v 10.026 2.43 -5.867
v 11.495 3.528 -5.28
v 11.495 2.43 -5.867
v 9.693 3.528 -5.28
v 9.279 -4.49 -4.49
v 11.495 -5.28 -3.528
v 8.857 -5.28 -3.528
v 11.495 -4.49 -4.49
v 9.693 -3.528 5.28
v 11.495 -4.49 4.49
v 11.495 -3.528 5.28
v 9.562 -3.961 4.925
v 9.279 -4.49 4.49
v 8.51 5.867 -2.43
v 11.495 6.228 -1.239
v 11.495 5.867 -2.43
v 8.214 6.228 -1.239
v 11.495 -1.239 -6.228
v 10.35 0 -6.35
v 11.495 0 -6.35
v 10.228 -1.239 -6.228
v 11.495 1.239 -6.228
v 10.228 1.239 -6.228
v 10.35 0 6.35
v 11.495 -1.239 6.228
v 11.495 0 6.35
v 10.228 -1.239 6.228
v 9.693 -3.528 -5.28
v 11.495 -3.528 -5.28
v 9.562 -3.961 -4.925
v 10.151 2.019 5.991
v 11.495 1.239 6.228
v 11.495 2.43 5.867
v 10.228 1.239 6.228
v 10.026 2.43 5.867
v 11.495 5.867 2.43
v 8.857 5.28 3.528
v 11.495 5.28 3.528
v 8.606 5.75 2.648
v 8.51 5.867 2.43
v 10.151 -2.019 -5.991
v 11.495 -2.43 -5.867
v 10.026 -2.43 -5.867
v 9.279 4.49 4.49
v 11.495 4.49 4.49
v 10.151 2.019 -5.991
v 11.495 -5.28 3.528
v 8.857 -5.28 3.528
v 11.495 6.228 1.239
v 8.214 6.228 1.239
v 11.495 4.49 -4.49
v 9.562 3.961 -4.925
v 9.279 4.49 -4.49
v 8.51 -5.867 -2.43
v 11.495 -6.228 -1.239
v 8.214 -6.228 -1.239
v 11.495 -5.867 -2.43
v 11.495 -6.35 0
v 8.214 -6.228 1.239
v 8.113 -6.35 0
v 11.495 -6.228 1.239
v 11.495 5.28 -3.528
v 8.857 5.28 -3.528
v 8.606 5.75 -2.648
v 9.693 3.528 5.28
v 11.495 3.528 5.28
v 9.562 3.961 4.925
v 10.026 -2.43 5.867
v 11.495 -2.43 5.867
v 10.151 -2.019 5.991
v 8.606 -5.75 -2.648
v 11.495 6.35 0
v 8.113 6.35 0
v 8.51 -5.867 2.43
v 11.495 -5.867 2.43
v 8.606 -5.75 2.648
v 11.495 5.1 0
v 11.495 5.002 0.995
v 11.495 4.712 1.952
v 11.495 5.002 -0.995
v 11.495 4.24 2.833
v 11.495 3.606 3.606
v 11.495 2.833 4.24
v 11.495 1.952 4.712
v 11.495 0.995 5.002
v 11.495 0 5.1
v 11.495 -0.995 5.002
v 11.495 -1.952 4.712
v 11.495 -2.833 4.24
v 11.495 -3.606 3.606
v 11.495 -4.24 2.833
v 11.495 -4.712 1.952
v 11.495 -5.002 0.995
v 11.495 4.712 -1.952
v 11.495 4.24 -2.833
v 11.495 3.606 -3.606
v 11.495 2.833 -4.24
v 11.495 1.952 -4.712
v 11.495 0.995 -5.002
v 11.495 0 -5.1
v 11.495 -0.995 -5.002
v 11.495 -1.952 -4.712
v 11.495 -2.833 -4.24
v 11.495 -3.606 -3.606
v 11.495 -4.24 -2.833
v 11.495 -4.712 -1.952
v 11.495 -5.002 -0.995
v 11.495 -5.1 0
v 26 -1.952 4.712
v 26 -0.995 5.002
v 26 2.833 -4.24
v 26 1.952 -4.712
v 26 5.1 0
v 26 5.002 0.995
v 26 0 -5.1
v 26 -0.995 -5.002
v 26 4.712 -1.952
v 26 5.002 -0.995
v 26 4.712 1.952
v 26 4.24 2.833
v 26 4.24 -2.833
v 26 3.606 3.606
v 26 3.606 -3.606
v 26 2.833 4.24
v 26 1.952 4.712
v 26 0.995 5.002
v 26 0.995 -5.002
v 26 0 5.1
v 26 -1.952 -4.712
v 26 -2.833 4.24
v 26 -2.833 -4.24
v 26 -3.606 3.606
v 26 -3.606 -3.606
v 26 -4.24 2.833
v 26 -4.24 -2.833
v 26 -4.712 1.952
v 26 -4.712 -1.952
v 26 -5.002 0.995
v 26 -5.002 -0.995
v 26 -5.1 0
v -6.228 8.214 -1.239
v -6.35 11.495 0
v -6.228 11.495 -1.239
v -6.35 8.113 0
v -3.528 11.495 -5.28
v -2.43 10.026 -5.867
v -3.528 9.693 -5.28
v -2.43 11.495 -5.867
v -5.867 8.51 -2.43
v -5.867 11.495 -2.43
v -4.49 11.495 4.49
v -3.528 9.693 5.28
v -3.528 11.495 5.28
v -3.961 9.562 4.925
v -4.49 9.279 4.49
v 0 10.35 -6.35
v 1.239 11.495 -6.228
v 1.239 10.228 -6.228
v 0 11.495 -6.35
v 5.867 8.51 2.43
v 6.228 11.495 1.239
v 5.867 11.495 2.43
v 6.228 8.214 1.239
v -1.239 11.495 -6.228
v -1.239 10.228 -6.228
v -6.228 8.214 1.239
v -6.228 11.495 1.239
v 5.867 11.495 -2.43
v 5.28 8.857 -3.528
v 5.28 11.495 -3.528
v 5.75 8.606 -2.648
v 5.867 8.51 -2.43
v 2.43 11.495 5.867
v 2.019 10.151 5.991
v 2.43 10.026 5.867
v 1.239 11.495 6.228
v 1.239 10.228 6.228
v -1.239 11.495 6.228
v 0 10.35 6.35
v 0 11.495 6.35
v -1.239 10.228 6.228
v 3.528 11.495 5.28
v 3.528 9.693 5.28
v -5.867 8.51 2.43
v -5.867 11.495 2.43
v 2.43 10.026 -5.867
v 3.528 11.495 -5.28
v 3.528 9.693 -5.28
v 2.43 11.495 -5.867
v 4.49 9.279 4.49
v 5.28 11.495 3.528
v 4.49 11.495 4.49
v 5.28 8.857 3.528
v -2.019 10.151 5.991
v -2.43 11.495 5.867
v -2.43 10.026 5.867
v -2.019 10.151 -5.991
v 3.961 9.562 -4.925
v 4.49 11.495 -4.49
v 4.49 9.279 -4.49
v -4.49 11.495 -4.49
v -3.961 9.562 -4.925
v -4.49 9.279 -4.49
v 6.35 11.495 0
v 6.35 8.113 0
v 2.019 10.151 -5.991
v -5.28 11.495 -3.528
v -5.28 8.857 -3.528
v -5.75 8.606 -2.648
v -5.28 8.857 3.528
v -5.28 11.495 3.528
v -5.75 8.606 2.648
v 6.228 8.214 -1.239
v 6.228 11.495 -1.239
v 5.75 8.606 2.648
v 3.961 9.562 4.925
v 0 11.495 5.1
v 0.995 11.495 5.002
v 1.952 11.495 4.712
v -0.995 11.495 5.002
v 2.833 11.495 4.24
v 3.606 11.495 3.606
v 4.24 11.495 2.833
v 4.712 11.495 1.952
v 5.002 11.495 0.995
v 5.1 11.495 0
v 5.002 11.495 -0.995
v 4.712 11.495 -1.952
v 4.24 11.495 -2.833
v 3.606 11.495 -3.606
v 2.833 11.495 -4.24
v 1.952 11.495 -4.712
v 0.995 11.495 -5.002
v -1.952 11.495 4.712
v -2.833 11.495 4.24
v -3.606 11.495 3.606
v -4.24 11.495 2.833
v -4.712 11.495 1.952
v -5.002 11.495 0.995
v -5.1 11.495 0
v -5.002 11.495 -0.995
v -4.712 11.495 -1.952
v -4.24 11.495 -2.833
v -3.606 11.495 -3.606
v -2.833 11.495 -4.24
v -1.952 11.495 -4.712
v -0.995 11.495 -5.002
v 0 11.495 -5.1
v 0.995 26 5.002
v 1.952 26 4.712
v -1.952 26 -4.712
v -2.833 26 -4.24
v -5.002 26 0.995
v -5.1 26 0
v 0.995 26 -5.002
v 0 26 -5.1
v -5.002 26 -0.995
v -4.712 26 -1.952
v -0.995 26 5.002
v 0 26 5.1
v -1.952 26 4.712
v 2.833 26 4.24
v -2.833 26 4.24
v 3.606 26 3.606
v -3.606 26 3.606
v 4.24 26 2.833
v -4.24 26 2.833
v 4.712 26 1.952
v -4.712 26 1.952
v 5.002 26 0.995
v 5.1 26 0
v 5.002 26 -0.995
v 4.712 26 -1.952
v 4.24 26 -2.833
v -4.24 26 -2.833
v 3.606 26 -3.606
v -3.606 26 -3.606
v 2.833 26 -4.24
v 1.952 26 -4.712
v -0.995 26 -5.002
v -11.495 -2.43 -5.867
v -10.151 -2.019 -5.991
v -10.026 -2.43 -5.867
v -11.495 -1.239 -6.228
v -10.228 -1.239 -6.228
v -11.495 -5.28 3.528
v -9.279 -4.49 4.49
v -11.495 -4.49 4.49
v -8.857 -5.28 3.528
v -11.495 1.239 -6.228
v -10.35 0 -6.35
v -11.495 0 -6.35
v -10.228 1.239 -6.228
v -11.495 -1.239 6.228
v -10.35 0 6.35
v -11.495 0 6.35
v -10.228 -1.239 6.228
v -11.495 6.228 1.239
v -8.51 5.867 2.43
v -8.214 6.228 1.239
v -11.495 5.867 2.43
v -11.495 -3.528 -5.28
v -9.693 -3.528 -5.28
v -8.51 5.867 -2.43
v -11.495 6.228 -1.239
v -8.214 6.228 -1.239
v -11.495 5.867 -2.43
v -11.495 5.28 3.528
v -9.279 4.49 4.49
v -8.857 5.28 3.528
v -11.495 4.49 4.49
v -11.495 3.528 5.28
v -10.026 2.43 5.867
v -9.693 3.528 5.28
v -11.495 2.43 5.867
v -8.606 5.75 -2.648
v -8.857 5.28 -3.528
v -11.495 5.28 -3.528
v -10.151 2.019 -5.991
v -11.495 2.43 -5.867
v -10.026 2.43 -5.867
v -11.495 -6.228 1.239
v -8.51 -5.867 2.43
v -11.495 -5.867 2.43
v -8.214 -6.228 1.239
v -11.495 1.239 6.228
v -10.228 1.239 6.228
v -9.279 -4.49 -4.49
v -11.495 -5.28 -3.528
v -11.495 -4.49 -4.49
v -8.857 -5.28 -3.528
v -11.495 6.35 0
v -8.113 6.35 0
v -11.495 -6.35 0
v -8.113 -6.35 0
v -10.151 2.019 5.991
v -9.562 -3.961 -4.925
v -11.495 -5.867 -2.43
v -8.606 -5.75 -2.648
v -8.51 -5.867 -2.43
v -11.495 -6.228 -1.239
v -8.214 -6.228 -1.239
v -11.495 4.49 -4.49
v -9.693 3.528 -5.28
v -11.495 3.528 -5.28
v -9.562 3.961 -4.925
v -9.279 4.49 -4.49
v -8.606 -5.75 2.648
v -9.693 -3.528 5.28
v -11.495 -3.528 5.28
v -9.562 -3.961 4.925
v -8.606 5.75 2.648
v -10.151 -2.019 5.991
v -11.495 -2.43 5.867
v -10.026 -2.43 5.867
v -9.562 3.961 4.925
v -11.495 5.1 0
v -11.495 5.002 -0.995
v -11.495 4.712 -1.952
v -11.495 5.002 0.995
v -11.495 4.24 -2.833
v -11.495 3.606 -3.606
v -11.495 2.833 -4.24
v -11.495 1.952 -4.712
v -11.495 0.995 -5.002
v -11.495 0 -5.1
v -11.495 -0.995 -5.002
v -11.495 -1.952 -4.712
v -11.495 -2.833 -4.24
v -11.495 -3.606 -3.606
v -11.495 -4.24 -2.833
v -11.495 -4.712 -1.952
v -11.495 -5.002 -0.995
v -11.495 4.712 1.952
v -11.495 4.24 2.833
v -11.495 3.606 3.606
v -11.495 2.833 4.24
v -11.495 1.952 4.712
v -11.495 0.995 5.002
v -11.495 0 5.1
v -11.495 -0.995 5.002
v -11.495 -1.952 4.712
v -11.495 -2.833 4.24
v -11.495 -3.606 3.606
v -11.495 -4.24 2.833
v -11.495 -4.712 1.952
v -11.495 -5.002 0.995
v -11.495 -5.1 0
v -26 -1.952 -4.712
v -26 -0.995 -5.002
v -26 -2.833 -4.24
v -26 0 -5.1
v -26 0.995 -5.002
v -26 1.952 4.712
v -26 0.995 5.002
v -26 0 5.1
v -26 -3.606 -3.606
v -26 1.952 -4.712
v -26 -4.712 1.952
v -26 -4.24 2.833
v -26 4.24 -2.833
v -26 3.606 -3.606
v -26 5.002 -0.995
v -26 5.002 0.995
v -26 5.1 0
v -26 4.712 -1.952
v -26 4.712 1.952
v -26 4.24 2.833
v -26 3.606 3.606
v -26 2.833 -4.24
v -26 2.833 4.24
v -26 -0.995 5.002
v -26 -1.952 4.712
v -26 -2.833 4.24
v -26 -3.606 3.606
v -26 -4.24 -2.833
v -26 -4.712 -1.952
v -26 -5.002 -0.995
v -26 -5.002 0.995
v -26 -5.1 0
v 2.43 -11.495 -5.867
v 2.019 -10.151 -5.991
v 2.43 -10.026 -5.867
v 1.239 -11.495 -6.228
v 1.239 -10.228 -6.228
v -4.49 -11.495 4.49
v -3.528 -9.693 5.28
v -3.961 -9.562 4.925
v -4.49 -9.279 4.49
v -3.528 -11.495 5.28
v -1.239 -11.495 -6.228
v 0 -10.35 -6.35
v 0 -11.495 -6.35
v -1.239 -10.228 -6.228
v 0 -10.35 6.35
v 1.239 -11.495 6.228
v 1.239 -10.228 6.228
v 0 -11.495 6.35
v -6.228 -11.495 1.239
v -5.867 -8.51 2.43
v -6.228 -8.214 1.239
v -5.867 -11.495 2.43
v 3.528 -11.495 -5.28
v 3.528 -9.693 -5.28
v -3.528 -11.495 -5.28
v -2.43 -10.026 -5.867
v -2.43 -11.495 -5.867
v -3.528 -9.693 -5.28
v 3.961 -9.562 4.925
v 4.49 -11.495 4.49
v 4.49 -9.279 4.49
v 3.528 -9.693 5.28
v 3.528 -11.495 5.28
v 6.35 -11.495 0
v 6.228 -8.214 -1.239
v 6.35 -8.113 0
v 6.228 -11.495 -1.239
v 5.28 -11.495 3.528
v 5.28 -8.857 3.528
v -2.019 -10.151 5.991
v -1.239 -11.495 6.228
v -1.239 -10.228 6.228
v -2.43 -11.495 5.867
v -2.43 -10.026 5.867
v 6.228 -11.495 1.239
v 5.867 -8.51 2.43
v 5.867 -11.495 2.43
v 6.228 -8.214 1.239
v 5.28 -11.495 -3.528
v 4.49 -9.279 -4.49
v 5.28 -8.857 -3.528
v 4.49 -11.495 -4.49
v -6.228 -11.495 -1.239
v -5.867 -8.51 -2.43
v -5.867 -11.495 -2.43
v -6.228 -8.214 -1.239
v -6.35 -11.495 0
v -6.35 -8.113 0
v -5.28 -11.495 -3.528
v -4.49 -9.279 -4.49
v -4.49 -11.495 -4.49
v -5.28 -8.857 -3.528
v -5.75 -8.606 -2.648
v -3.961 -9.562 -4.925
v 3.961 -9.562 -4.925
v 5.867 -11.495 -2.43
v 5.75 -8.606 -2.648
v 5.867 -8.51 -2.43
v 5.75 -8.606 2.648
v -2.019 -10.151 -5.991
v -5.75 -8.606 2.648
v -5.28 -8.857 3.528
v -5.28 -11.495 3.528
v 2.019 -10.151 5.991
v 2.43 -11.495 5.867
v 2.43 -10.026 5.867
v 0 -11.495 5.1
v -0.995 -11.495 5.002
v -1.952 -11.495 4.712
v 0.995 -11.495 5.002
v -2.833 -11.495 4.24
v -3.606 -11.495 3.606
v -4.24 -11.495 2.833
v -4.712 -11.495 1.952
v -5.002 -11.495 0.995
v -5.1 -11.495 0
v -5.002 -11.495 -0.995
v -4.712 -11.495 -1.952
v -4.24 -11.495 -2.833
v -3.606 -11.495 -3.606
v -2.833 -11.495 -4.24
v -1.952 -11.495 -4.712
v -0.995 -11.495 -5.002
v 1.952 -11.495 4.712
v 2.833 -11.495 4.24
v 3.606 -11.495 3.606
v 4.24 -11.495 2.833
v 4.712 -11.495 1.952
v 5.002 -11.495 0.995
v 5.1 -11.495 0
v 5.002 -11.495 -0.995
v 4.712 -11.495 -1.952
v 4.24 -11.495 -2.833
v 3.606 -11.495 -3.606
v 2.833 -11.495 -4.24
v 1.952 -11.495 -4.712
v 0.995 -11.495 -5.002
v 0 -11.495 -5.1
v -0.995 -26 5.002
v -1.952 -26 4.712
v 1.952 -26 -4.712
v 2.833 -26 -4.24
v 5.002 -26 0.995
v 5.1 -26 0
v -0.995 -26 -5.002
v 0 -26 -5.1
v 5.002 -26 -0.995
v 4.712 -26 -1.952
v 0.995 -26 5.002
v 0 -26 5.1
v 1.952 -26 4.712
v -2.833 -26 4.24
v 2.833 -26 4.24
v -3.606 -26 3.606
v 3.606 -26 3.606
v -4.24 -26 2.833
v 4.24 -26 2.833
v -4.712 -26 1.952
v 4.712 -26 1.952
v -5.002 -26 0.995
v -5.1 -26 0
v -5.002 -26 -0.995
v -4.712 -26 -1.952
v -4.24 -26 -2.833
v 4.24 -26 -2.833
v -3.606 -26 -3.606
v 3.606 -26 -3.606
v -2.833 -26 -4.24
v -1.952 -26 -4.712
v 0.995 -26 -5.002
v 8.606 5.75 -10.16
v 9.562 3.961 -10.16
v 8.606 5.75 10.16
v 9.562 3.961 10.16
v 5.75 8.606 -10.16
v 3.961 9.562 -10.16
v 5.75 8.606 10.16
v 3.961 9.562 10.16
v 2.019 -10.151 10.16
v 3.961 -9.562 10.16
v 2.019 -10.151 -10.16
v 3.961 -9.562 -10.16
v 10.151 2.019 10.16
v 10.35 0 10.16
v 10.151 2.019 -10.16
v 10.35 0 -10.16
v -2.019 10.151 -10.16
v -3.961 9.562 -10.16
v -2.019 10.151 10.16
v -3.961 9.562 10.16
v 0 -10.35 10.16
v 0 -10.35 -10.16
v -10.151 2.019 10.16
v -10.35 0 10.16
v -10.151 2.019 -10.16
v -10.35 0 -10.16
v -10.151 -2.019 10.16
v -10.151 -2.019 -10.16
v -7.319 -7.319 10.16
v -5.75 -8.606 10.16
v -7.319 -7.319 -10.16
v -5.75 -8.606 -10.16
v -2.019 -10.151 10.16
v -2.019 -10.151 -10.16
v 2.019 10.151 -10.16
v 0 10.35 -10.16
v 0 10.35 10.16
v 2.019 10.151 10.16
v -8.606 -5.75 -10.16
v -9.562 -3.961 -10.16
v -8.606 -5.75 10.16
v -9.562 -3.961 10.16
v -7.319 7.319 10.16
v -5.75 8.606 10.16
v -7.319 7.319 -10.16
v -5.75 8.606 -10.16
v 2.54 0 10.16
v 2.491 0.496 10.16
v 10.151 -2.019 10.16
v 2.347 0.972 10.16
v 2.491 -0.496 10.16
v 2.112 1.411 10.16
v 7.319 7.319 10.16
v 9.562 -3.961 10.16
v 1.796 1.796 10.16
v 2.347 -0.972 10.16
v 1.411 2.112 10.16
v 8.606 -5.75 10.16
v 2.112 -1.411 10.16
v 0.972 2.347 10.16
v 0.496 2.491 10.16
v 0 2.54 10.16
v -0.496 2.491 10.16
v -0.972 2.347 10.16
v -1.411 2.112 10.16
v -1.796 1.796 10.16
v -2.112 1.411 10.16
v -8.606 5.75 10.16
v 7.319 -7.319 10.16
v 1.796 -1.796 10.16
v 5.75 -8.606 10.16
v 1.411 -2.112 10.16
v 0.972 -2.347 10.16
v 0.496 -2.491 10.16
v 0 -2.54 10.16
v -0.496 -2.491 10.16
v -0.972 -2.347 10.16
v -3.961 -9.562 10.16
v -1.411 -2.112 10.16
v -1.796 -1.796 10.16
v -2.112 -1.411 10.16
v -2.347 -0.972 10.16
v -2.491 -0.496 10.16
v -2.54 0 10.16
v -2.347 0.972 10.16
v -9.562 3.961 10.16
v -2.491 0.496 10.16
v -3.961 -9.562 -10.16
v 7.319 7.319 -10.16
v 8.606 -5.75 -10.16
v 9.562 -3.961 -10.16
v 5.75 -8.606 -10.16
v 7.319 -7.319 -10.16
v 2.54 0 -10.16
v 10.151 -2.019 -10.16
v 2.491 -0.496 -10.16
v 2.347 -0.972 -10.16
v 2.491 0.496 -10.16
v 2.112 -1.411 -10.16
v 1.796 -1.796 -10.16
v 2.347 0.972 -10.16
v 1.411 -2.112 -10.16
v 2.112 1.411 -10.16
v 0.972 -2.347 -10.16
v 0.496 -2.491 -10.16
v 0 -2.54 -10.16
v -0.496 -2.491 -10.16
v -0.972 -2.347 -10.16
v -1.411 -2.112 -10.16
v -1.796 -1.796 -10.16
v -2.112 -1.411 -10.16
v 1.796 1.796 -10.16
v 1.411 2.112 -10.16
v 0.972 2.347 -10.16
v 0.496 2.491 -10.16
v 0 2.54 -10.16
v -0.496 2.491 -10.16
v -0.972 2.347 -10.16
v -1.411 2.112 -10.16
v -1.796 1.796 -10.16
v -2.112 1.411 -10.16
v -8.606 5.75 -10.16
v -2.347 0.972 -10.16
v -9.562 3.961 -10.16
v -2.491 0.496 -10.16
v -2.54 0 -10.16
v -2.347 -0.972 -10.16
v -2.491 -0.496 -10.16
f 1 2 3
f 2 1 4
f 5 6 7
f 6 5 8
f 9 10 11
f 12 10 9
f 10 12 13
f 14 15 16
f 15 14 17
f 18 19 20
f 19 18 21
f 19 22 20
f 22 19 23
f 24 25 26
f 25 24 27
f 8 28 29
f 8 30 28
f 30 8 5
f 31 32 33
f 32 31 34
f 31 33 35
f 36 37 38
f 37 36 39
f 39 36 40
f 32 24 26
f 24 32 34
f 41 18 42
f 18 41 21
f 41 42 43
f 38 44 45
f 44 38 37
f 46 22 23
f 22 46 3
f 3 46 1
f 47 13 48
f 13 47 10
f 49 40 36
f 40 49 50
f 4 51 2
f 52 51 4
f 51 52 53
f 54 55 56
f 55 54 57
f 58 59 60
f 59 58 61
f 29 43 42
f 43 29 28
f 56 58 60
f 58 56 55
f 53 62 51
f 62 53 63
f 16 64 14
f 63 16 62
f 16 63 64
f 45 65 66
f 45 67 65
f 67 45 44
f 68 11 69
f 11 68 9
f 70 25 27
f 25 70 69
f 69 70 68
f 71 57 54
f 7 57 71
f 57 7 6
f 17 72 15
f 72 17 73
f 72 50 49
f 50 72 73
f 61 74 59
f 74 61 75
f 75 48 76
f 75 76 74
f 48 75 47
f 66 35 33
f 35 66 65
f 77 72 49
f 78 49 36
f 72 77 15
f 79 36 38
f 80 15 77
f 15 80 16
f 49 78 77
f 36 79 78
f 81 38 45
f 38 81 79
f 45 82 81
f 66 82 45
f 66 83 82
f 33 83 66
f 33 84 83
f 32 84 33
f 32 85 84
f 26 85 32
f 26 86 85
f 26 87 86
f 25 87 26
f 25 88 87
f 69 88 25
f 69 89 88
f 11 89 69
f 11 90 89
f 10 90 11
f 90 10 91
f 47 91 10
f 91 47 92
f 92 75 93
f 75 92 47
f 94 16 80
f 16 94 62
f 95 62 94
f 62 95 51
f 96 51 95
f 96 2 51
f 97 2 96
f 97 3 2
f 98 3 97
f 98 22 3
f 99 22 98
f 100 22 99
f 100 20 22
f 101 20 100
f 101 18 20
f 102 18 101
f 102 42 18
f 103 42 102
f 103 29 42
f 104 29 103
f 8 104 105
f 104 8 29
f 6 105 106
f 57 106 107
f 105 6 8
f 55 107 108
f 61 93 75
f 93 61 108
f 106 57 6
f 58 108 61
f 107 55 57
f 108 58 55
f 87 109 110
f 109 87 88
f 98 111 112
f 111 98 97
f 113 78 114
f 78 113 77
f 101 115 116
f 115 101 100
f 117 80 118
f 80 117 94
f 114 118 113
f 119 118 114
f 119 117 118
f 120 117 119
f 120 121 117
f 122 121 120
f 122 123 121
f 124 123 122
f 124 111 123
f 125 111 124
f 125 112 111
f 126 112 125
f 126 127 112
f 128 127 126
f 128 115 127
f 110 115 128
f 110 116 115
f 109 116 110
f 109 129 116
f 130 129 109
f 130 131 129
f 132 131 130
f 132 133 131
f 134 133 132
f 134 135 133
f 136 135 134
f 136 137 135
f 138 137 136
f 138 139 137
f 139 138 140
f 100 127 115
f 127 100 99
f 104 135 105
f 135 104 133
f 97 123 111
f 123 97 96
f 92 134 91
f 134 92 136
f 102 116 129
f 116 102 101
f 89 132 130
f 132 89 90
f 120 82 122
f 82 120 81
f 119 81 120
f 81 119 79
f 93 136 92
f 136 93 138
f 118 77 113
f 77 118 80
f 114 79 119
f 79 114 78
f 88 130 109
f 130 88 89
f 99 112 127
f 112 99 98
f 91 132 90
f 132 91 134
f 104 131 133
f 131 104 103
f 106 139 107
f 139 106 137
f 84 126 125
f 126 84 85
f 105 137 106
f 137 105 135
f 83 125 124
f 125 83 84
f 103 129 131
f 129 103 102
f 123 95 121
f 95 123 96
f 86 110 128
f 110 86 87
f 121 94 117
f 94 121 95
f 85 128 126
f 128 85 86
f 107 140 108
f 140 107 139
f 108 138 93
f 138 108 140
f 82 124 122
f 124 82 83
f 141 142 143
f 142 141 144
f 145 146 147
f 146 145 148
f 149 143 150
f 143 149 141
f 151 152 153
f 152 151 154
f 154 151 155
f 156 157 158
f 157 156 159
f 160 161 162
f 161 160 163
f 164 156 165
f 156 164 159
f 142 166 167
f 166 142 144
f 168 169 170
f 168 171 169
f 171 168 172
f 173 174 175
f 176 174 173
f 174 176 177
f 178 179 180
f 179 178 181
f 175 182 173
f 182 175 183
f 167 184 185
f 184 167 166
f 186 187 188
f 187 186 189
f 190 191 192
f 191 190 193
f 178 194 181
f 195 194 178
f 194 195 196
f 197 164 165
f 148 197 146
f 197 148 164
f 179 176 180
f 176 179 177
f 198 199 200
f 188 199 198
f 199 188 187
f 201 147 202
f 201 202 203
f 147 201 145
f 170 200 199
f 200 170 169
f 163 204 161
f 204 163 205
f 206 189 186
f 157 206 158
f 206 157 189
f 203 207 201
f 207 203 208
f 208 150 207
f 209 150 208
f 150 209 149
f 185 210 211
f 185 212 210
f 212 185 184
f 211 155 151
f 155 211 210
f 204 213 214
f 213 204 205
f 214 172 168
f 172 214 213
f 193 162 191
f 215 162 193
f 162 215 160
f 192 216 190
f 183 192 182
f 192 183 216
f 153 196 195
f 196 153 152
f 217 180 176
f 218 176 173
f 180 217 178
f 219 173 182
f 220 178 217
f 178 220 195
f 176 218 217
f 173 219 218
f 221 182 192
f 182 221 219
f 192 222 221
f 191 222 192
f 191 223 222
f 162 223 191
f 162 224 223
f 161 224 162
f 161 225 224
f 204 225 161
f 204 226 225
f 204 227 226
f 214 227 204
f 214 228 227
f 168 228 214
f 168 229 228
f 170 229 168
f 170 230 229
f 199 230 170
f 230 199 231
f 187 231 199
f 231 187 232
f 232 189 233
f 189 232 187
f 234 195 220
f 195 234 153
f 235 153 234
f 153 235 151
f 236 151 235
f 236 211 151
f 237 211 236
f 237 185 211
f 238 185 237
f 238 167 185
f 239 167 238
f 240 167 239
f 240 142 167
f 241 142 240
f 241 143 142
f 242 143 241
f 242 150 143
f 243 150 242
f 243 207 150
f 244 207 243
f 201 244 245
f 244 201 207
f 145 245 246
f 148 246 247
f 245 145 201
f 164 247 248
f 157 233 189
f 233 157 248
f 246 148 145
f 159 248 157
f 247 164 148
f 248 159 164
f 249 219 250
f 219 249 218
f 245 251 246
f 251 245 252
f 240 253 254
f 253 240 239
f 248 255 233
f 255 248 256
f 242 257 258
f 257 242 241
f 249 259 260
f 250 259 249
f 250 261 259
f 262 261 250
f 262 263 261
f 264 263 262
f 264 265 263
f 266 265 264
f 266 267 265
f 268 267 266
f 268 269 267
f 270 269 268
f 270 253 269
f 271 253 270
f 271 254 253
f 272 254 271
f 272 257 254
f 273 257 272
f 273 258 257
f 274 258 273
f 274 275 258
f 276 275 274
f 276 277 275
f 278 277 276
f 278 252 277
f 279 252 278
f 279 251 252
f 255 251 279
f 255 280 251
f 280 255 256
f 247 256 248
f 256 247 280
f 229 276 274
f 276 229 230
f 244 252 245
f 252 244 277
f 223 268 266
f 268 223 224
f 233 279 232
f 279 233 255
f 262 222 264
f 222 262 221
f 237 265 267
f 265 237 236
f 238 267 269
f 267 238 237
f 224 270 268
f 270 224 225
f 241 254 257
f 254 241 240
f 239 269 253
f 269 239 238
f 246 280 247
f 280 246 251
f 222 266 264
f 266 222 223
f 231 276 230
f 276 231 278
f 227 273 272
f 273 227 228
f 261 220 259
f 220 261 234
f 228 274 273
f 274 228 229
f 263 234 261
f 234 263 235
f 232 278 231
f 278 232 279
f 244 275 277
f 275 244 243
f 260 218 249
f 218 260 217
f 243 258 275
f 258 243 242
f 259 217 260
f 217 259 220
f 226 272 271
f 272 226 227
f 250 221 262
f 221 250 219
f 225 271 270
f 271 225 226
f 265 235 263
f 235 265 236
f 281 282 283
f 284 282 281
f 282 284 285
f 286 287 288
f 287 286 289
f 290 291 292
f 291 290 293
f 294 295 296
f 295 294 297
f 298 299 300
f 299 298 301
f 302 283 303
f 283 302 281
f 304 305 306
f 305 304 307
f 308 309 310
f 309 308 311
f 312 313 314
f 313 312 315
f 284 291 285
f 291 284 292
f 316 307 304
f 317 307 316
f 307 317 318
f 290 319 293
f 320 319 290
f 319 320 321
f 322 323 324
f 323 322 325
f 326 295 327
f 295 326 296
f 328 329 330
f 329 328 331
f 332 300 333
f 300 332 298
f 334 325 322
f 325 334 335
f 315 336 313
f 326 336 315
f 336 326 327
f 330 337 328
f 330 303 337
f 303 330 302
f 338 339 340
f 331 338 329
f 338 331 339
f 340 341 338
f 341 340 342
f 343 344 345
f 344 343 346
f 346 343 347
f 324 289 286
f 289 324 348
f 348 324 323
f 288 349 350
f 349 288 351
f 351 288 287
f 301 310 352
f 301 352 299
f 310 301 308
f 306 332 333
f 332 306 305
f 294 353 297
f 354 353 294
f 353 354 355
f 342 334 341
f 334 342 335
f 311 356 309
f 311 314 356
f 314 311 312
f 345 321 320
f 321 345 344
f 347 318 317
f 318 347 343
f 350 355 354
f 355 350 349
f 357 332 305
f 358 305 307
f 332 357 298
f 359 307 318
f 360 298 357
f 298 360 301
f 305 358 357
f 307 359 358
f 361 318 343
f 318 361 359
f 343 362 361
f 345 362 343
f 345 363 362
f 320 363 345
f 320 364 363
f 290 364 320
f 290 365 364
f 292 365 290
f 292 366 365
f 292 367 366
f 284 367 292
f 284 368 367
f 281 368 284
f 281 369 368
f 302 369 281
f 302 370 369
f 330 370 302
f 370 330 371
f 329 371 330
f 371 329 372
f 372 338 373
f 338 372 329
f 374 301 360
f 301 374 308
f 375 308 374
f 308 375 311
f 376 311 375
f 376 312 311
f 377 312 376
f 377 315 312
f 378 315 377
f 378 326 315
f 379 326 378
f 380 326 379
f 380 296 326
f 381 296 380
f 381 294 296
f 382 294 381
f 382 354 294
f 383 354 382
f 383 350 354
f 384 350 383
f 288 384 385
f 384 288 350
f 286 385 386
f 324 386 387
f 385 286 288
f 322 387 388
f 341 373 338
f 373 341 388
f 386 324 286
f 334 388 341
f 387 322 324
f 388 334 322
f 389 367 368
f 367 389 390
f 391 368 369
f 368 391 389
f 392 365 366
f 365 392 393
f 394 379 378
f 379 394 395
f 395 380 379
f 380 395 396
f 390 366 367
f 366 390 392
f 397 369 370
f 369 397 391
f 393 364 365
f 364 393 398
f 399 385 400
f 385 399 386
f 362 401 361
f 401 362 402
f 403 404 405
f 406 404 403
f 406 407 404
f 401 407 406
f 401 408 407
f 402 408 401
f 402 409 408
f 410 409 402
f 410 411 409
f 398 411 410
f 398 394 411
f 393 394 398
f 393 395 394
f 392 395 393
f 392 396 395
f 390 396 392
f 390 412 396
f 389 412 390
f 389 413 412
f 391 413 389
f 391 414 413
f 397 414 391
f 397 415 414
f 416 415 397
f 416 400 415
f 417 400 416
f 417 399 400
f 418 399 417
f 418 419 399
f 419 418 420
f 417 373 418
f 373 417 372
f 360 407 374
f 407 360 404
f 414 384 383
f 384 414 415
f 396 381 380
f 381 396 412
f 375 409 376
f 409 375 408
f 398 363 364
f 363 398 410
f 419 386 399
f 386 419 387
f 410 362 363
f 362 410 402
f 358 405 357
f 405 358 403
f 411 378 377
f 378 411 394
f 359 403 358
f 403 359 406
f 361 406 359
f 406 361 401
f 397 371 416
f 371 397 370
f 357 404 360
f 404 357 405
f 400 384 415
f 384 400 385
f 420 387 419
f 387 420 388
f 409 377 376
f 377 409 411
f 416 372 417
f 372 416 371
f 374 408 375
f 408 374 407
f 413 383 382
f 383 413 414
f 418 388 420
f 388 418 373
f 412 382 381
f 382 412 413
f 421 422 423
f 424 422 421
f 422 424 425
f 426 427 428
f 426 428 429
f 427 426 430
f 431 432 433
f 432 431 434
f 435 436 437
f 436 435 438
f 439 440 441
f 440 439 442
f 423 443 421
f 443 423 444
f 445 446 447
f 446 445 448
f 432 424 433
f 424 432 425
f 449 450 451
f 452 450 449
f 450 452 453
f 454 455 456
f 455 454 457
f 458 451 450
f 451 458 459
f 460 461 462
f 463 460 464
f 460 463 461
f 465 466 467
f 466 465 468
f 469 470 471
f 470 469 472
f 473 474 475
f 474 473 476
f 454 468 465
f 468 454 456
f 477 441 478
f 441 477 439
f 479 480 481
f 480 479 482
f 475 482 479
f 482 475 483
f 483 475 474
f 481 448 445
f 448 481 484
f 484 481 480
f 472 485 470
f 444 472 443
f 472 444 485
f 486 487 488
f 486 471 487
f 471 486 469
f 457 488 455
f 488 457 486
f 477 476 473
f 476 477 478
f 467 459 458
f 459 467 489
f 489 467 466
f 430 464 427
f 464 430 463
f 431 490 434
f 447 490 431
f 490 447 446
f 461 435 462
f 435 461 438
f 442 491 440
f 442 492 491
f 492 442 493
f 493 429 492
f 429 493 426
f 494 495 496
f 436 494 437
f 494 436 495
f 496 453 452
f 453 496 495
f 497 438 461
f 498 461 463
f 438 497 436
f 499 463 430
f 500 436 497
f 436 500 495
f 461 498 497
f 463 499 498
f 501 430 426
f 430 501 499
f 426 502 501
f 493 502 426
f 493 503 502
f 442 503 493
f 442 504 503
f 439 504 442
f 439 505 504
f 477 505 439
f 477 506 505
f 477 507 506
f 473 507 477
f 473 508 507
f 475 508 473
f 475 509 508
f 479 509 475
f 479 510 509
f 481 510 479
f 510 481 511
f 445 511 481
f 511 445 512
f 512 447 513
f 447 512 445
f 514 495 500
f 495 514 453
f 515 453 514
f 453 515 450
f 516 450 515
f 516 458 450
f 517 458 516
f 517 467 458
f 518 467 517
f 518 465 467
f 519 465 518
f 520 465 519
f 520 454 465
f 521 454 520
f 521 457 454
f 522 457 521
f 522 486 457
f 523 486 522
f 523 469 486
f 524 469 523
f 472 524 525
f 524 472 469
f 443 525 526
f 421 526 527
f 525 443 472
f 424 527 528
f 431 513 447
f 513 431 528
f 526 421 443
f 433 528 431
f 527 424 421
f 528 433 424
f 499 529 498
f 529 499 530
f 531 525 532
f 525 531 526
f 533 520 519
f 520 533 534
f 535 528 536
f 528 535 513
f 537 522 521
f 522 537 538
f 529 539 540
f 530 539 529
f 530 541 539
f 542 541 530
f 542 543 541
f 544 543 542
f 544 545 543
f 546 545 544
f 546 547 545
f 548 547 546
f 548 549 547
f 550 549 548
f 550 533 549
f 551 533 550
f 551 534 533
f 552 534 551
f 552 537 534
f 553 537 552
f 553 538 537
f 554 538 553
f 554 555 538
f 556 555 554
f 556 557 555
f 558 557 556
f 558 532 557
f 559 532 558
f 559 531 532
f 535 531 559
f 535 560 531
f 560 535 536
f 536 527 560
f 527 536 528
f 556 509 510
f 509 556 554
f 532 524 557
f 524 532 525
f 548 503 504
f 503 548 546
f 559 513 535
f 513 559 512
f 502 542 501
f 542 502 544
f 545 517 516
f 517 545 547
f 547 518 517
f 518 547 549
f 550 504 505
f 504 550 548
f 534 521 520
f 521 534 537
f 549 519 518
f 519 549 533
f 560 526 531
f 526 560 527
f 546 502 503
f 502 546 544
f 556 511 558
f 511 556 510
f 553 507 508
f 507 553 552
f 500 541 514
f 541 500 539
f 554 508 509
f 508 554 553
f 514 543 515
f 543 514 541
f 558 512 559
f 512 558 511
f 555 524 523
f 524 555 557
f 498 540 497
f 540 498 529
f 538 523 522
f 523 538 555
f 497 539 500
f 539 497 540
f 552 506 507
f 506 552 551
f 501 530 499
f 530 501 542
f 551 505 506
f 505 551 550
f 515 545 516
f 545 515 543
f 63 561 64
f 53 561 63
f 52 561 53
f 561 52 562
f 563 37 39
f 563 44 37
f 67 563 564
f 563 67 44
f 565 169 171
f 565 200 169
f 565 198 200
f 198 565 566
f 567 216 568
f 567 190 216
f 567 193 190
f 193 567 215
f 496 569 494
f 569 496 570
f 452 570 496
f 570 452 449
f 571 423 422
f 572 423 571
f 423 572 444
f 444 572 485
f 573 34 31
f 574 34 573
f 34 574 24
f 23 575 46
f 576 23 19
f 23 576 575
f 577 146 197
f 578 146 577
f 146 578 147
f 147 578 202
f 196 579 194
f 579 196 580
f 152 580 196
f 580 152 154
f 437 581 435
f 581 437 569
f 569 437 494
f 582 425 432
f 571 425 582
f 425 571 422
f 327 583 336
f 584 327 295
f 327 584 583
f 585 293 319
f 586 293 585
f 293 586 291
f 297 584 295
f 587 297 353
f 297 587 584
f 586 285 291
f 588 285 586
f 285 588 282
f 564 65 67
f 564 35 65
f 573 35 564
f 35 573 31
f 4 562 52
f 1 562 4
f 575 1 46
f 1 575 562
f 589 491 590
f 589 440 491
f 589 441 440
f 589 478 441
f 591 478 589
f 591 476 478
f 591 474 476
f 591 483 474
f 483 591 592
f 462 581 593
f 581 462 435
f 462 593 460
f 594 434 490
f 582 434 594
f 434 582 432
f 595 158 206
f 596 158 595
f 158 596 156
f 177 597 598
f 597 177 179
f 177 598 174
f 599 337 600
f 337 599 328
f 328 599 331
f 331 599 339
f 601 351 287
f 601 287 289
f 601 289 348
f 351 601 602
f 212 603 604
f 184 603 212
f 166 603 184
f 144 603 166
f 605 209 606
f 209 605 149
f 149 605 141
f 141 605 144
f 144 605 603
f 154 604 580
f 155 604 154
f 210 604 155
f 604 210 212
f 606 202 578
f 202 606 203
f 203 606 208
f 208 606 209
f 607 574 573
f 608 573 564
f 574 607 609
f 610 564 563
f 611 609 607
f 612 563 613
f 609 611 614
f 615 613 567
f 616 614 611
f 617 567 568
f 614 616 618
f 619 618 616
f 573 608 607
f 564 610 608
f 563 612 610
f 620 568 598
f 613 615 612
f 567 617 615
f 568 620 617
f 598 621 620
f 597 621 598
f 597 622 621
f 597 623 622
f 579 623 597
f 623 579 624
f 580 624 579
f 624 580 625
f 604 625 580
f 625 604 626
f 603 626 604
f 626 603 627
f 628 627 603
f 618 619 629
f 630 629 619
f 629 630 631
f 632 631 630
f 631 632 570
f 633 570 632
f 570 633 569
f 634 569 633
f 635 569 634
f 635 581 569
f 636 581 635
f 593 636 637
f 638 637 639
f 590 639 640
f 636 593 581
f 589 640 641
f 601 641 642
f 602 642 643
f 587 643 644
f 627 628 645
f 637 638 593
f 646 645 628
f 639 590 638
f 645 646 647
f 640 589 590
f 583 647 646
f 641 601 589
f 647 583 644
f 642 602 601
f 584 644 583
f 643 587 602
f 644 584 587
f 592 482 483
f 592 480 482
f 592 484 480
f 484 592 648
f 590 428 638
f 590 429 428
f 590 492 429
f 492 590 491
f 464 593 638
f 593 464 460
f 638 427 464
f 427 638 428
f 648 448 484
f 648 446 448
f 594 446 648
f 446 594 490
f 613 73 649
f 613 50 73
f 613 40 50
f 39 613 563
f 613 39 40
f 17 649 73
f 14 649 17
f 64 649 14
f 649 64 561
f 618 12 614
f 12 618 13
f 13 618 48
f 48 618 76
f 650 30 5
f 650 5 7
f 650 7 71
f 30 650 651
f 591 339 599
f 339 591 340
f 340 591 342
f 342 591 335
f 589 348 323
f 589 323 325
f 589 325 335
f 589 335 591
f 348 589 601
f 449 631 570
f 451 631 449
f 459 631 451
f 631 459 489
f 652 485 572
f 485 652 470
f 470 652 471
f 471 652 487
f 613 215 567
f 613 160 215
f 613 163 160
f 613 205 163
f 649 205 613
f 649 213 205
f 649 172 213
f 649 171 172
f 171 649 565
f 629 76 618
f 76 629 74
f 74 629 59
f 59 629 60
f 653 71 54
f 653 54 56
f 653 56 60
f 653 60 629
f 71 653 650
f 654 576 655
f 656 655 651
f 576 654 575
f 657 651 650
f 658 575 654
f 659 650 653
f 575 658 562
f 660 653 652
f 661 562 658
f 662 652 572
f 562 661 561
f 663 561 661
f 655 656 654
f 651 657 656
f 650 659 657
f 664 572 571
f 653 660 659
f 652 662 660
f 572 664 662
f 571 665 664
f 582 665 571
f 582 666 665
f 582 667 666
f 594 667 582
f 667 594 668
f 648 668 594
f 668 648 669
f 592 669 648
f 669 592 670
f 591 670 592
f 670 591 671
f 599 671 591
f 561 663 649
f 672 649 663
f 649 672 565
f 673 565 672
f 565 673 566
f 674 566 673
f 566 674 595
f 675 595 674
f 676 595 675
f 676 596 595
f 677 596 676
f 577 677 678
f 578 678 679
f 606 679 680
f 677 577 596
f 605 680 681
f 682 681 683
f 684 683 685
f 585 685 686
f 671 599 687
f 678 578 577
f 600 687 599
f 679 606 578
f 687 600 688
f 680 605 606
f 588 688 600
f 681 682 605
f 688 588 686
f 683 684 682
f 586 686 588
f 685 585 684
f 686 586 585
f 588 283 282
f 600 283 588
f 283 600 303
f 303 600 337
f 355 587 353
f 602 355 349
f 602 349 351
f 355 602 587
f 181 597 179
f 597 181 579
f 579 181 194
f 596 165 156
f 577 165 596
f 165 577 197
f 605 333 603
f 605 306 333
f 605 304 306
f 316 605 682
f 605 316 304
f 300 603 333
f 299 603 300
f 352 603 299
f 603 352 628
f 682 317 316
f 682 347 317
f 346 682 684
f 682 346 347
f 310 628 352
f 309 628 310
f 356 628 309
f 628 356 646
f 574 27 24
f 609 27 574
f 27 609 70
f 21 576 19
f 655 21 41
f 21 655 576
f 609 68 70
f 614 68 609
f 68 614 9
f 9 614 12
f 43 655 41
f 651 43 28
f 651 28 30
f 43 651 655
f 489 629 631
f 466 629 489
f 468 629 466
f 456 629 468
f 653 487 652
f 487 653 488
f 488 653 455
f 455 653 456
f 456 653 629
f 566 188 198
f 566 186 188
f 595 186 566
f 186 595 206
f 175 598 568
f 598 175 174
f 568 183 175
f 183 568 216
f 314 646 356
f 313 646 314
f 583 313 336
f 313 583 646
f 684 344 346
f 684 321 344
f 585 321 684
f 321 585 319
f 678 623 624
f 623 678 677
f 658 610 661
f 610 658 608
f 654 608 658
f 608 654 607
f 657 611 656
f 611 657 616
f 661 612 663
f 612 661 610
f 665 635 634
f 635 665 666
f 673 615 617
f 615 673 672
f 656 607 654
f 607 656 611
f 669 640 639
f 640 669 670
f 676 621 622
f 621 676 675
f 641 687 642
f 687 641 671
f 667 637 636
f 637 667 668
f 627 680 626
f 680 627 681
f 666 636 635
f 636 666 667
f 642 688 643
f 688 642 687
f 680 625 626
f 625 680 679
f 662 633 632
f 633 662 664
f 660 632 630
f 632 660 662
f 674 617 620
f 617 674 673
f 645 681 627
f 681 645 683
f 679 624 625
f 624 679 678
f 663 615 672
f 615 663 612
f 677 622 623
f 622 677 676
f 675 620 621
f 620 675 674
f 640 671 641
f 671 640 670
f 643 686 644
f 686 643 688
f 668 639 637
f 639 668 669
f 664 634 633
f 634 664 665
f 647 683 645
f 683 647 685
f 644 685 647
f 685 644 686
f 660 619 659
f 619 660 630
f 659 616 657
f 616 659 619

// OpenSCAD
$fn = 32;

// ----------------------------------------------------------------------
// Cardan cross: 52 mm span, 12.7 mm trunnions
// ----------------------------------------------------------------------

// --- parameters (mm) ---
journal_d = 12.7;         // trunnion diameter
arm_len = 26;             // trunnion length from the centre
step_r = 4.32;            // step position from the centre
step_d = 10.2;            // journal diameter after the step
hub_d = 20.7;             // hub diameter
hub_h = 20.32;            // hub height
bore_d = 5.08;            // hub bore

difference() {
  union() {
    /* hub along the joint axis */
    cylinder(h = hub_h, d = hub_d, center = true);
    for (a = [0 : 90 : 270]) rotate([0, 0, a]) {
      /* trunnion, sunk into the hub */
      translate([hub_d / 4, 0, 0]) rotate([0, 90, 0]) cylinder(h = step_r + 2, d = journal_d);
      /* stepped journal out to the tip */
      translate([step_r - 0.5, 0, 0]) rotate([0, 90, 0]) cylinder(h = arm_len + 0.5 - step_r, d = step_d);
    }
  }
  /* lubrication bore through the hub, 2.5 mm clear on both sides */
  translate([0, 0, -hub_h / 2 - 2.5]) cylinder(h = hub_h + 5, d = bore_d);
}
